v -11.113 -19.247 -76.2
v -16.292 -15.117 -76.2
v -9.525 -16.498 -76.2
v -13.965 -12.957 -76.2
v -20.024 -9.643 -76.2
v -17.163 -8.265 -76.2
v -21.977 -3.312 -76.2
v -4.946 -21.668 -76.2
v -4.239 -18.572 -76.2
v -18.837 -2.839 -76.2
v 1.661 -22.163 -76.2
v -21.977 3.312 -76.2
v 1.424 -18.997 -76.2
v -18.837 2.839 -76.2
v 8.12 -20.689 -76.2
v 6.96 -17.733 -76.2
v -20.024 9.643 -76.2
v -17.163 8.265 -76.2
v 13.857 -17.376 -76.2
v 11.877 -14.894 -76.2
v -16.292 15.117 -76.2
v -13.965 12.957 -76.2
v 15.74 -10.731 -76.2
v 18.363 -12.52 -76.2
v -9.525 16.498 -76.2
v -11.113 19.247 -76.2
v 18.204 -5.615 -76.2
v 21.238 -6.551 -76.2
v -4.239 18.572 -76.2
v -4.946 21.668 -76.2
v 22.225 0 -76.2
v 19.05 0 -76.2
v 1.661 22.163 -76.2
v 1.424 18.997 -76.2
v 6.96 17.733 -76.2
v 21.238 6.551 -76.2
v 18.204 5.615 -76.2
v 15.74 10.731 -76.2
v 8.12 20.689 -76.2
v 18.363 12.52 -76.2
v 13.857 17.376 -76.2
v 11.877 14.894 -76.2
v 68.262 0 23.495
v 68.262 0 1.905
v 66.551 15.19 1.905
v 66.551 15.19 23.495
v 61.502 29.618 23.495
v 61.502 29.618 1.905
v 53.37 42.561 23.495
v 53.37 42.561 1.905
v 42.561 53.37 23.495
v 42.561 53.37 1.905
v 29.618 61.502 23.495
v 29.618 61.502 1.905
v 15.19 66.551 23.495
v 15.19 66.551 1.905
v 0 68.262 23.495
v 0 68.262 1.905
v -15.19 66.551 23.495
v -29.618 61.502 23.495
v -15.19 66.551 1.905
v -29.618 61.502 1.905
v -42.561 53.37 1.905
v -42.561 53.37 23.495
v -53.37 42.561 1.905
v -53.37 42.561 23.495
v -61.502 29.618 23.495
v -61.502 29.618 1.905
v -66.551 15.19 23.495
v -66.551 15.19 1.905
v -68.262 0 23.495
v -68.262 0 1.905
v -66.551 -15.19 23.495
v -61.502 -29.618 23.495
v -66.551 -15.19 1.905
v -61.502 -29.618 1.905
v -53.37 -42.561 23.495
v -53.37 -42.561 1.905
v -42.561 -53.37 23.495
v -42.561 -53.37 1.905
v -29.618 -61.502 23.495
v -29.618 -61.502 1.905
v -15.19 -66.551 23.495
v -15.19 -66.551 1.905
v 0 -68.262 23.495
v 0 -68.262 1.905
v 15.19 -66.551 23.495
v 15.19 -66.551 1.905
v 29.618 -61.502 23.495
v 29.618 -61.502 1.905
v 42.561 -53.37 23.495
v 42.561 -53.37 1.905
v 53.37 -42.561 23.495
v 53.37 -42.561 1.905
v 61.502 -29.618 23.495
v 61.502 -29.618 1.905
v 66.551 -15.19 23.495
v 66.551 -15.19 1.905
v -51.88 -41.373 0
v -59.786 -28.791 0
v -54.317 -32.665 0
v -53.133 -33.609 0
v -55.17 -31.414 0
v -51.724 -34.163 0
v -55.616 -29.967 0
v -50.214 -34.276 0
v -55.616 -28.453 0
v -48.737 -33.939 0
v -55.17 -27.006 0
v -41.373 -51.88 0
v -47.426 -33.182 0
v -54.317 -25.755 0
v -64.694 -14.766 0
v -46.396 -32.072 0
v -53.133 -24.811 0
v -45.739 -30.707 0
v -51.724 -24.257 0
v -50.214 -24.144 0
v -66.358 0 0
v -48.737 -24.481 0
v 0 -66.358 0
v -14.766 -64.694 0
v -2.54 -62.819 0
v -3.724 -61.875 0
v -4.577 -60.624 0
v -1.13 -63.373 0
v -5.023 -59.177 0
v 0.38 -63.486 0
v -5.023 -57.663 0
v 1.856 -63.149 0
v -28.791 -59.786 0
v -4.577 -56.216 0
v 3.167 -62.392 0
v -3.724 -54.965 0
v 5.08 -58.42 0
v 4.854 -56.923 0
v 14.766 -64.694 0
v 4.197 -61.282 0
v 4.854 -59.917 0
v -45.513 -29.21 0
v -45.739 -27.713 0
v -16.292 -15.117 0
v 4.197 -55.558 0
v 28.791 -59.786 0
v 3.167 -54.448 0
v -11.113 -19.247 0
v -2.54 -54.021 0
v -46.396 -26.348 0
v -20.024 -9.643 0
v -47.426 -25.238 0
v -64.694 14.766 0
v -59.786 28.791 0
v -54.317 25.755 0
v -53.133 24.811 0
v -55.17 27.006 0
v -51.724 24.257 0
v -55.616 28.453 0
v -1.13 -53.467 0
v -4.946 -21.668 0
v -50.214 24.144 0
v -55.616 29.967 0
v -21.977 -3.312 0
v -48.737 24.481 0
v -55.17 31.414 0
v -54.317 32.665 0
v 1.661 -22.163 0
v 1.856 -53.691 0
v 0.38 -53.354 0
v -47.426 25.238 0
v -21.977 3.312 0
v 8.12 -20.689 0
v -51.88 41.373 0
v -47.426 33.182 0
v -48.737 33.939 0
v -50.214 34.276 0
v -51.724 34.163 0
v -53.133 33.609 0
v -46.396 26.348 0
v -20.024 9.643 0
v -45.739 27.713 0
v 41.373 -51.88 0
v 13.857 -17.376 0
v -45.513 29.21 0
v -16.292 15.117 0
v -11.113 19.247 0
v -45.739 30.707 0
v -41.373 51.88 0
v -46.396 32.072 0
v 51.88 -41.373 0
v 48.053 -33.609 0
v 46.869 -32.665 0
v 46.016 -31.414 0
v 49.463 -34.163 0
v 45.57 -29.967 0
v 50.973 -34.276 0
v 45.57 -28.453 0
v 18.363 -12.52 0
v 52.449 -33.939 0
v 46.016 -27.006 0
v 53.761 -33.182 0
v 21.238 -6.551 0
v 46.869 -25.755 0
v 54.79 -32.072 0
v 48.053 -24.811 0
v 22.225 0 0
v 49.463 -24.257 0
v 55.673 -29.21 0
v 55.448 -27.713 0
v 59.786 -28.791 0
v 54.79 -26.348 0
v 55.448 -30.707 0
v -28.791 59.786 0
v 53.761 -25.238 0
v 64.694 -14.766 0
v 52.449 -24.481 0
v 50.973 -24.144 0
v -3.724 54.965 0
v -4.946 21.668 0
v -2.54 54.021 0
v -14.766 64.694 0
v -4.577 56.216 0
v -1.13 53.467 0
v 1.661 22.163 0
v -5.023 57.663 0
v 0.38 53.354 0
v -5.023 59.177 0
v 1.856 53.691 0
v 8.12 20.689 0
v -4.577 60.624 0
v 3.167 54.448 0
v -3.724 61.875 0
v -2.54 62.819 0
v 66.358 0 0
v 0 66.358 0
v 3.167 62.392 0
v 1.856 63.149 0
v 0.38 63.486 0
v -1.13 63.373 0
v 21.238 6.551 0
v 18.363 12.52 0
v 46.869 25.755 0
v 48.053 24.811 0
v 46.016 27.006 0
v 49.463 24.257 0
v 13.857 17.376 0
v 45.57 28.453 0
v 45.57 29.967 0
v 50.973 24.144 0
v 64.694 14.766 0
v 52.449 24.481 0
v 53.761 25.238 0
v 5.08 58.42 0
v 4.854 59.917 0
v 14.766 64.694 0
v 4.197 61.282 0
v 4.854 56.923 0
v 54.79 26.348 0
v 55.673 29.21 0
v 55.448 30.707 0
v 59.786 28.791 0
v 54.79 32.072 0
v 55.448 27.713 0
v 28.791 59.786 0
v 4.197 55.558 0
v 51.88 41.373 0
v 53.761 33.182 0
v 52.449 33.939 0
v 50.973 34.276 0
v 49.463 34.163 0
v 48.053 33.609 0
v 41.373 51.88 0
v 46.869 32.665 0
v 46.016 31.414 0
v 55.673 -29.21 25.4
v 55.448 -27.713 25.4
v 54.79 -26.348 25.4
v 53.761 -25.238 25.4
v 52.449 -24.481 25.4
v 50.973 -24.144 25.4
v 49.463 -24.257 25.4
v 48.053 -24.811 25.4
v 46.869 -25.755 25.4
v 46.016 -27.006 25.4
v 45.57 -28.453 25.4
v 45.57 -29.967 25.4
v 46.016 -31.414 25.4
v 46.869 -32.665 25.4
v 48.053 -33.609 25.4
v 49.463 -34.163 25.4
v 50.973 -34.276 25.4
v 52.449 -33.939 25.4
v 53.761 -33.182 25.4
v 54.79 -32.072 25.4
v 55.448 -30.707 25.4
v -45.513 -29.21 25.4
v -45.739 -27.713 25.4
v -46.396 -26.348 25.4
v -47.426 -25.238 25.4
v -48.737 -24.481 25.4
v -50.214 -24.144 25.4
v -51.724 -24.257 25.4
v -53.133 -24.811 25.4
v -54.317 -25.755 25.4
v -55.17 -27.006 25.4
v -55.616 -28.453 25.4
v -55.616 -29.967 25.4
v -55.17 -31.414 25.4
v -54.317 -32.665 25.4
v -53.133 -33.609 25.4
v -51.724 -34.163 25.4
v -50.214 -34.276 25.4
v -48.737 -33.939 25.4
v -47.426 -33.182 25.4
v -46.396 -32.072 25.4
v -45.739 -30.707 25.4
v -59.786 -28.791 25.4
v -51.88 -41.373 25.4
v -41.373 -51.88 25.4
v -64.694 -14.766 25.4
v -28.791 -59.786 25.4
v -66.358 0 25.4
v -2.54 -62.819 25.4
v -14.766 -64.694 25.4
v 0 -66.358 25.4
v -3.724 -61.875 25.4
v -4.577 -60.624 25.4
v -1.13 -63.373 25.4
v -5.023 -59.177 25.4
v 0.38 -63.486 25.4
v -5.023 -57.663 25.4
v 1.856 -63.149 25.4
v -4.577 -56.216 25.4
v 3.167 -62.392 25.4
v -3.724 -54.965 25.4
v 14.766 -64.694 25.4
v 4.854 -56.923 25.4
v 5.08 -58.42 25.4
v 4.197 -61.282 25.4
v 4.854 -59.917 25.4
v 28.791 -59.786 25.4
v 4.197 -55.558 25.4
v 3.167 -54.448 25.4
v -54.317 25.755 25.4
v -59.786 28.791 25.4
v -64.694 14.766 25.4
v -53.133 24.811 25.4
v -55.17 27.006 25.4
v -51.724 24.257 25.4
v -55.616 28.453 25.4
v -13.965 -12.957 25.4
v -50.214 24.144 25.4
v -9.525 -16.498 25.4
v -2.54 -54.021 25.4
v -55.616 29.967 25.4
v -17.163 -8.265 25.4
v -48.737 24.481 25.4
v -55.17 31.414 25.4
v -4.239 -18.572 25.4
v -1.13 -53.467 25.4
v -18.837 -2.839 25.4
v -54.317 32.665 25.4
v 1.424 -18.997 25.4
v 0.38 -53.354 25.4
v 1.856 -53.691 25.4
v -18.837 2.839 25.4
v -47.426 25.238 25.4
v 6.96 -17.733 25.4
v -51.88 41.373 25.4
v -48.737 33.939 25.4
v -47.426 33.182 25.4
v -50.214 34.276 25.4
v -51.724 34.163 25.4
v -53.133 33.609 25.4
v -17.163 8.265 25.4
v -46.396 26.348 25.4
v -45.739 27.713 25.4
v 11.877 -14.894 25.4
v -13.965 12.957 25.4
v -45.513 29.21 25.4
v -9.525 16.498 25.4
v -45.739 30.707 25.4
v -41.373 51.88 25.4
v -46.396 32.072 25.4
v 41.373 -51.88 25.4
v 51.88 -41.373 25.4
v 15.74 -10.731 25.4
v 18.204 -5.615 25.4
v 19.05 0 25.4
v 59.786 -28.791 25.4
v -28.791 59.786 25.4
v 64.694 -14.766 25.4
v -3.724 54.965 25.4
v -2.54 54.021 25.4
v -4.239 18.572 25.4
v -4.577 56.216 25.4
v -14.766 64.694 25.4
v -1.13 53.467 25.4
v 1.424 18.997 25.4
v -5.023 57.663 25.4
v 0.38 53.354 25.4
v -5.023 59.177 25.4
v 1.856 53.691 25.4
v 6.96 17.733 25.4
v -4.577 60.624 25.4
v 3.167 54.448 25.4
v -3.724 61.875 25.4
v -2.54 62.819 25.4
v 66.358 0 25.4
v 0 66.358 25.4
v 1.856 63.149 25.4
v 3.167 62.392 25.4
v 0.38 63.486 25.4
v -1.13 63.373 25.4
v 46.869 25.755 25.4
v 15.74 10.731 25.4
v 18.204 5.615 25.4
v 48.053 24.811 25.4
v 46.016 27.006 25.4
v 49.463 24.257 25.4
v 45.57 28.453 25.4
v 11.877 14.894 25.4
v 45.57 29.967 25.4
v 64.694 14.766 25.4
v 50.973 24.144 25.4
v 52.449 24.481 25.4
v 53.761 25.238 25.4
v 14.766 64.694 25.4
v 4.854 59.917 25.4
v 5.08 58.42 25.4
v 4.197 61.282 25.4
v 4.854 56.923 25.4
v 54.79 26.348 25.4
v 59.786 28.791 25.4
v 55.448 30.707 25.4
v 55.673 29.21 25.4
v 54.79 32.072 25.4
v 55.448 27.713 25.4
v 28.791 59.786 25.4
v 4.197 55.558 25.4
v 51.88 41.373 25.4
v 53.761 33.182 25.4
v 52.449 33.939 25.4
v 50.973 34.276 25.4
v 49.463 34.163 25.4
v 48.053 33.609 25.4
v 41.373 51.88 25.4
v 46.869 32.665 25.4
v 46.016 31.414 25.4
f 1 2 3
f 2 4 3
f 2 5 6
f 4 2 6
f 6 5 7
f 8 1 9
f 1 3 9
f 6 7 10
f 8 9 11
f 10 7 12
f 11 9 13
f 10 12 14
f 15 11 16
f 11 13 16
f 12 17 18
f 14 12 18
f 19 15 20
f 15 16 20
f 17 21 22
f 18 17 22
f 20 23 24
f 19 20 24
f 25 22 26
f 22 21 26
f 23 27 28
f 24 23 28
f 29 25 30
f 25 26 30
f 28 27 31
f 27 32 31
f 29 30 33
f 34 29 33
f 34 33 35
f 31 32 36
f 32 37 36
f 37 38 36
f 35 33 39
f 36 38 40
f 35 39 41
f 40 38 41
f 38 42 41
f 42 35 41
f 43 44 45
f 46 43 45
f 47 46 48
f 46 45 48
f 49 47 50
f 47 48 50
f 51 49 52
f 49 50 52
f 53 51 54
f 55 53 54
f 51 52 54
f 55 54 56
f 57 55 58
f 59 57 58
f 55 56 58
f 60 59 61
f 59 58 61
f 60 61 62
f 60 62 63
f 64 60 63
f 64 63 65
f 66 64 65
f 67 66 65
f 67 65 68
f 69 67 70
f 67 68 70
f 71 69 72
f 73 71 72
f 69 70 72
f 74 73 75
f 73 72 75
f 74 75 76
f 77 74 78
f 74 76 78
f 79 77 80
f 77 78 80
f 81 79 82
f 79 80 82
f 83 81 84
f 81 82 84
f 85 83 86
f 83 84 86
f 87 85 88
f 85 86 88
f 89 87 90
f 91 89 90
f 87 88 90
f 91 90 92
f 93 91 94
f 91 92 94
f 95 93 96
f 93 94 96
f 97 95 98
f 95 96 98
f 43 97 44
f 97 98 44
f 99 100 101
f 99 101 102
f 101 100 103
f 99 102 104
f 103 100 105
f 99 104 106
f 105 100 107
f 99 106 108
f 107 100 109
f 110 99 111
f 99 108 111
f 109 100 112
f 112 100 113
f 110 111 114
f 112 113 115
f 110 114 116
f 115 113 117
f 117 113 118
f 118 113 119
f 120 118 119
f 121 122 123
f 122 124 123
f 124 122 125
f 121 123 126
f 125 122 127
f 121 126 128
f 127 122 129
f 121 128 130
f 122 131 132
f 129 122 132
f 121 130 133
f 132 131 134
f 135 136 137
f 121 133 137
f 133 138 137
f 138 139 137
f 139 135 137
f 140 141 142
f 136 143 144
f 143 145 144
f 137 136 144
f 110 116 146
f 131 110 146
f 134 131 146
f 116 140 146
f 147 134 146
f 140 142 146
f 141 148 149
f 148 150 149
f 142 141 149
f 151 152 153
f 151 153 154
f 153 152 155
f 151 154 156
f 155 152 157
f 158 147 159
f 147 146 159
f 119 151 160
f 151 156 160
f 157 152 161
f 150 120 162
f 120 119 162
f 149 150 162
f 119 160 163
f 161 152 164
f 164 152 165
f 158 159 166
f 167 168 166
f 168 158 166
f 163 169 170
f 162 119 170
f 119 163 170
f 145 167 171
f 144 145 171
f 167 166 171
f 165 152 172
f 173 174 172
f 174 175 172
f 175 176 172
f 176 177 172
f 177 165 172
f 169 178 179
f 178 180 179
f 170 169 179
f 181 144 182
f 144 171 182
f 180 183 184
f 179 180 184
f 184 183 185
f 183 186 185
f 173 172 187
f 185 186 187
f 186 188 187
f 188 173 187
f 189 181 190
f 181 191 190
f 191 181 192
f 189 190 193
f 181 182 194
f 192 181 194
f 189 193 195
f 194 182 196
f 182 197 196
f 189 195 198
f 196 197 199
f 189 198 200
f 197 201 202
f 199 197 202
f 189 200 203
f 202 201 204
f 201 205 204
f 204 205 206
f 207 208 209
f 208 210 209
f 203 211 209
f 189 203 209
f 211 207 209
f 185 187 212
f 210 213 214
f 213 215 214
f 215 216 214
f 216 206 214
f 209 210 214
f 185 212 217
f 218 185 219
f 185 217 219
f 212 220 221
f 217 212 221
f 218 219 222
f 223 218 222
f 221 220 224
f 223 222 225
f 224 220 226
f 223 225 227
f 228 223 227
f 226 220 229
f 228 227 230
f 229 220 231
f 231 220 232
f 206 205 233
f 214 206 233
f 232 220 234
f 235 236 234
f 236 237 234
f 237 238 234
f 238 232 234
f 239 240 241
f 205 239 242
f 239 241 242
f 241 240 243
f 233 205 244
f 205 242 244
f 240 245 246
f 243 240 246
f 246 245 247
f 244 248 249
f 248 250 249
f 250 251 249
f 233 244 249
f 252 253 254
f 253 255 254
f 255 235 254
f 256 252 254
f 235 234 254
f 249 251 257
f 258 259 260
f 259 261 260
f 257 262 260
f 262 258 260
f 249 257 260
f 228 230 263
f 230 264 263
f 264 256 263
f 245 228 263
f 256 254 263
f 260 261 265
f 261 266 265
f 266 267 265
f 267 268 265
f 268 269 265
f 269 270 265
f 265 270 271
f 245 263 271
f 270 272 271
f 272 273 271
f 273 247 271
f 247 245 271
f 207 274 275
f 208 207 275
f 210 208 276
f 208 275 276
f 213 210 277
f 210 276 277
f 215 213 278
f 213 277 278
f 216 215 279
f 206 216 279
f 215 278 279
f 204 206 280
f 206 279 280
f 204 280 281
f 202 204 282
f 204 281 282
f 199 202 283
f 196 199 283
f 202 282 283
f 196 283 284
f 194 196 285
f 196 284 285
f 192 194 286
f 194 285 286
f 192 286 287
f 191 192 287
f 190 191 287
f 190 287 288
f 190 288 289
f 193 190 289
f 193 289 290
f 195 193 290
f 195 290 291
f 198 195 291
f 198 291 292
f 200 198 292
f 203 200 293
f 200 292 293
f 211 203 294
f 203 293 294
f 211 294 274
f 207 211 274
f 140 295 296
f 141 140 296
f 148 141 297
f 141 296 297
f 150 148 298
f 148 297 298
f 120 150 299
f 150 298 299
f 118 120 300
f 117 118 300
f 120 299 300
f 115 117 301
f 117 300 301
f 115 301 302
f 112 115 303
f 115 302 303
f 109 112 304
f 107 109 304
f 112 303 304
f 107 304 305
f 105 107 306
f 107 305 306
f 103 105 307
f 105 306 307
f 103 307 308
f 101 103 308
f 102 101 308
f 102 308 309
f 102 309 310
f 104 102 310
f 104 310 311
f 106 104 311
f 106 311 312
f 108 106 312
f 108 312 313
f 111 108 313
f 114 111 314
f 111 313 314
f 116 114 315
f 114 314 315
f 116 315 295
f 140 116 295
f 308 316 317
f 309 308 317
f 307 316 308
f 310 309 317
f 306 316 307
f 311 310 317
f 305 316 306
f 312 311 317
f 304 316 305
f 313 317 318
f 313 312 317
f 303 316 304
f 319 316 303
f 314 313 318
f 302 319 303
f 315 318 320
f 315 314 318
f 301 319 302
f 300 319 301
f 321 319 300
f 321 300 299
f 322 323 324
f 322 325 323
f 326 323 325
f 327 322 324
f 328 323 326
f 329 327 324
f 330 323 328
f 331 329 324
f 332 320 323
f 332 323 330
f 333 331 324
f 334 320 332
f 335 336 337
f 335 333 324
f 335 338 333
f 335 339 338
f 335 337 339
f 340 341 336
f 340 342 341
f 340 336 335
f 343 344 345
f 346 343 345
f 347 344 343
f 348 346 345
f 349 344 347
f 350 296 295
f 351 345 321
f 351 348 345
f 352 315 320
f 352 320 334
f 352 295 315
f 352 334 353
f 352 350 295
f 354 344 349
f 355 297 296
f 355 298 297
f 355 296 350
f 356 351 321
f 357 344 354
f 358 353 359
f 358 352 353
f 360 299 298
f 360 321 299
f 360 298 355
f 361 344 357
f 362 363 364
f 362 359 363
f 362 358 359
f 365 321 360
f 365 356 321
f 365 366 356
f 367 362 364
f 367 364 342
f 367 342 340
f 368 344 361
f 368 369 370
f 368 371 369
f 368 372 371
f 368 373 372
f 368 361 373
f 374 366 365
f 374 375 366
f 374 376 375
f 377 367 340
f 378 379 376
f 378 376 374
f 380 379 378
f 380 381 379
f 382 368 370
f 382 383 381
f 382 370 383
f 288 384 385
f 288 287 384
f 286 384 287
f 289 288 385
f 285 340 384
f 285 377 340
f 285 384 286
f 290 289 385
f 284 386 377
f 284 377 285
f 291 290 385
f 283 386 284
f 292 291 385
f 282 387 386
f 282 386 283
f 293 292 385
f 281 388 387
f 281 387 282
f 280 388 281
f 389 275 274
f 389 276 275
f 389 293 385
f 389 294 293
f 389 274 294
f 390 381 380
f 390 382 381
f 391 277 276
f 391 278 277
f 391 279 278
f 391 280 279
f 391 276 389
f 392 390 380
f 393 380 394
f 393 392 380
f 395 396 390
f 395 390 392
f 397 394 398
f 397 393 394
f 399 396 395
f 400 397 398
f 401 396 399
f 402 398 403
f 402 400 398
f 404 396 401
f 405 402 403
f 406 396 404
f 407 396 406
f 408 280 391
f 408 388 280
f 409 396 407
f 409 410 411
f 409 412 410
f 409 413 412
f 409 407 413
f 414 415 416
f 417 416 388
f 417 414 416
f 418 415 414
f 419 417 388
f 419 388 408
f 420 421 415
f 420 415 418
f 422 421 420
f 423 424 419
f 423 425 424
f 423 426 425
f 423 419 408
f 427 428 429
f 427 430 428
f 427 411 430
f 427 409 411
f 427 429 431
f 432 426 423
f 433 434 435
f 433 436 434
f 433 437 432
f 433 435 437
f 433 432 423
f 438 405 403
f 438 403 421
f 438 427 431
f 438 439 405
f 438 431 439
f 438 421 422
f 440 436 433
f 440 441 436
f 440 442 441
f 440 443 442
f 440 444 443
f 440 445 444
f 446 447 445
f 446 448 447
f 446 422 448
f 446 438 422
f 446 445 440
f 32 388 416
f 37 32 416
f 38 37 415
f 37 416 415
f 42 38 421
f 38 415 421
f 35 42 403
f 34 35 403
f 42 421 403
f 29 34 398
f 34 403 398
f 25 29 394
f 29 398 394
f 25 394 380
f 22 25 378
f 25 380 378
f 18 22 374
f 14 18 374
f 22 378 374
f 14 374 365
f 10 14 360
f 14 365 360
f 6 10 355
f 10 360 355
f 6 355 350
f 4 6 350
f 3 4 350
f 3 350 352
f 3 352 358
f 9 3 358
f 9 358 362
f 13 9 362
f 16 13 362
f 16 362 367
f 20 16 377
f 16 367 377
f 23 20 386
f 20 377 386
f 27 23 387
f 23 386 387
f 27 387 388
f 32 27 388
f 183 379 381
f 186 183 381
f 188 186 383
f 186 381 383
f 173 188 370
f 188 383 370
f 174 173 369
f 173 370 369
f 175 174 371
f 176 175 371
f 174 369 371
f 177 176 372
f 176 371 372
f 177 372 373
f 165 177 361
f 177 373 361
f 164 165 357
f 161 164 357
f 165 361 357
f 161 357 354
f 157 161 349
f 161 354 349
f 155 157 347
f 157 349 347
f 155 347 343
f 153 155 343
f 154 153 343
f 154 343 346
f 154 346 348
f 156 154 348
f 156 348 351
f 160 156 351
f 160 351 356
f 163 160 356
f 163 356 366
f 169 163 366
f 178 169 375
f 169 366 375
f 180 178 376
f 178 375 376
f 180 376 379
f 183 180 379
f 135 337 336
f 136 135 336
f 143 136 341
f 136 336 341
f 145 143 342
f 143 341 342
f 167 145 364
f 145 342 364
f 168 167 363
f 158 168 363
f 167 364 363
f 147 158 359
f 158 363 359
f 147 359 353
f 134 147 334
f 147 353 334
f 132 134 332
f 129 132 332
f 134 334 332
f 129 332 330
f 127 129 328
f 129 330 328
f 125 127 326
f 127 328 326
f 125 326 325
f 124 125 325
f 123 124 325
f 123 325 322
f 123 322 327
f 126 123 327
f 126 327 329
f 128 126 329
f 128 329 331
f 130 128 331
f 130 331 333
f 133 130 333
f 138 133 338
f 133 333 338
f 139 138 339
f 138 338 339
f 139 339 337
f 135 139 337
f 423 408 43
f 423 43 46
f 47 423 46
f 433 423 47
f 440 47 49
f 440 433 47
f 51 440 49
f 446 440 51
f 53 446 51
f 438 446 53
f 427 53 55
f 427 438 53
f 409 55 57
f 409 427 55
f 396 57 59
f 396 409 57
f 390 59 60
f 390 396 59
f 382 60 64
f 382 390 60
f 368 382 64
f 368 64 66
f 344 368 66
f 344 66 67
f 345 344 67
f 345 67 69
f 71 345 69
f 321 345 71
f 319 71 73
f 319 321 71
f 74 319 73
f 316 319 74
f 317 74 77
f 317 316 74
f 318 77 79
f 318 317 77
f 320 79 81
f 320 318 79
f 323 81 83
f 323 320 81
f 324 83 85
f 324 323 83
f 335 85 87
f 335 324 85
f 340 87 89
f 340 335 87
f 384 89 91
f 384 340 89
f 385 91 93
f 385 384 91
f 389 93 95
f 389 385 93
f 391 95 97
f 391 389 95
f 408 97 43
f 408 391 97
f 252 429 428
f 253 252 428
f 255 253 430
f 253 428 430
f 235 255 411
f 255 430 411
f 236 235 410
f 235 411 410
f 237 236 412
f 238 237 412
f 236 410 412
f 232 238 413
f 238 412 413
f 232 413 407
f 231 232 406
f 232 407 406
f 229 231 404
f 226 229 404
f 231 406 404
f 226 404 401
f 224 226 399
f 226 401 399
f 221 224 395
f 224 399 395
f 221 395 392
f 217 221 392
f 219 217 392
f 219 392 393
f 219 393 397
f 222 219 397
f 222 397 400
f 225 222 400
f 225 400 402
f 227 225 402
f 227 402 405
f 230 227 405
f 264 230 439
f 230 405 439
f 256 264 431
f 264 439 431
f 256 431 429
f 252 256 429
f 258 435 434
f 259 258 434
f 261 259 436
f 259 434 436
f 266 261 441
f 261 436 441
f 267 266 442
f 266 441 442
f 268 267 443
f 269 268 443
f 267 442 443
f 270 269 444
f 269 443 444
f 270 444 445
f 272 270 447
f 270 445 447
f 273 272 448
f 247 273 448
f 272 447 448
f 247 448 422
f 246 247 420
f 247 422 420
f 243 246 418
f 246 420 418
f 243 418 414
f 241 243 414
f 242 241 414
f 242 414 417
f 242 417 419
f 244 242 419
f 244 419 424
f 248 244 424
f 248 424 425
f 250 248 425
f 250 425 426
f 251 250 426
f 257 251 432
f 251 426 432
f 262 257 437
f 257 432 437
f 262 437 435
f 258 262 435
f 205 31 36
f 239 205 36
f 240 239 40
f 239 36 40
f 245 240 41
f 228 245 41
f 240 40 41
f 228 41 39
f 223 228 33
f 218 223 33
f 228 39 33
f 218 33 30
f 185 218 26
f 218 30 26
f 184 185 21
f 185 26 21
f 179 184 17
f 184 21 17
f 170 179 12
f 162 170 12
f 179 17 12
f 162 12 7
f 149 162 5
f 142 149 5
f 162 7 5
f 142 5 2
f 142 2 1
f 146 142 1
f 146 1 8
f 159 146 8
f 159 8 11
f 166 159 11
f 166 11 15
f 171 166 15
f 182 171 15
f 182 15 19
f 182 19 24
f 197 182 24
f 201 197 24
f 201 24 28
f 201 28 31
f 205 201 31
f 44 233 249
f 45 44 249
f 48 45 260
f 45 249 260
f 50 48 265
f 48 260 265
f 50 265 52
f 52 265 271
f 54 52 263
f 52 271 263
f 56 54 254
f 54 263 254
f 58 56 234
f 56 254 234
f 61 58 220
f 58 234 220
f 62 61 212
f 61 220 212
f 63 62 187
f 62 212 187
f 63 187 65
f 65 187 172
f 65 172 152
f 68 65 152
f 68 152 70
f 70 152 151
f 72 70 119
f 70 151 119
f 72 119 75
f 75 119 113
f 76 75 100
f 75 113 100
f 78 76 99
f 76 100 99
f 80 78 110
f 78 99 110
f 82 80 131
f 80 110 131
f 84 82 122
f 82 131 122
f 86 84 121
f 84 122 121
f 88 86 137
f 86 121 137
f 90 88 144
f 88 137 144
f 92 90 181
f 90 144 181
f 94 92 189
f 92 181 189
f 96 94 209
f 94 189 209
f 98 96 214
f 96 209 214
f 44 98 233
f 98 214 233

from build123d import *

# Parameters (mm, degrees)
F0_R      = 68.2625
F1_DEPTH  = 25.4
F2_R      = 38.1
F3_DEPTH  = 101.6
F4_R      = 19.05
F5_DEPTH  = 101.6
F6_R      = 22.225
F7_DEPTH  = 76.2
F8_R      = 5.08
F9_DEPTH  = 25.4
F10_SIZE  = 1.905
F11_DEPTH = 101.6


with BuildPart() as f1:
    # F0 (on Top) → F1 (new body)
    with BuildSketch(Plane.XY):
        Circle(F0_R)
    extrude(amount=F1_DEPTH)

    # F2 (on face) → F3 (join)
    with BuildSketch(Plane(origin=(0, 0, 0), x_dir=(1, 0, 0), z_dir=(0, 0, -1))):
        Circle(F2_R)
    extrude(amount=F3_DEPTH)

    # F4 (on face) → F5 (cut)
    with BuildSketch(Plane.XY.offset(25.4)):
        Circle(F4_R)
    extrude(amount=-F5_DEPTH, mode=Mode.SUBTRACT)

    # F6 (on face) → F7 (cut)
    with BuildSketch(Plane.XY.offset(-76.2)):
        Circle(F6_R)
    extrude(amount=-F7_DEPTH, mode=Mode.SUBTRACT)

    # F8 (on face) → F9 (cut)
    with BuildSketch(Plane.XY.offset(25.4)):
        with Locations((0, 58.42)):
            Circle(F8_R)
        with Locations((-50.5932040891, 29.21)):
            Circle(F8_R)
        with Locations((-50.5932040891, -29.21)):
            Circle(F8_R)
        with Locations((0, -58.42)):
            Circle(F8_R)
        with Locations((50.5932040891, -29.21)):
            Circle(F8_R)
        with Locations((50.5932040891, 29.21)):
            Circle(F8_R)
    extrude(amount=-F9_DEPTH, mode=Mode.SUBTRACT)

    # F10
    f10_edges = [f1.edges().sort_by_distance(p)[0] for p in [
        (-68.2625, 0, 25.4),
        (-68.2625, 0, 0),
    ]]
    chamfer(f10_edges, length=F10_SIZE)

    # F11 (cut): a face of the model
    f11_faces = [f1.faces().sort_by_distance(p)[0] for p in [
        (-37.0223692655, 0, -101.6),
    ]]
    extrude(f11_faces, amount=-F11_DEPTH, mode=Mode.SUBTRACT)


solid = f1.part
